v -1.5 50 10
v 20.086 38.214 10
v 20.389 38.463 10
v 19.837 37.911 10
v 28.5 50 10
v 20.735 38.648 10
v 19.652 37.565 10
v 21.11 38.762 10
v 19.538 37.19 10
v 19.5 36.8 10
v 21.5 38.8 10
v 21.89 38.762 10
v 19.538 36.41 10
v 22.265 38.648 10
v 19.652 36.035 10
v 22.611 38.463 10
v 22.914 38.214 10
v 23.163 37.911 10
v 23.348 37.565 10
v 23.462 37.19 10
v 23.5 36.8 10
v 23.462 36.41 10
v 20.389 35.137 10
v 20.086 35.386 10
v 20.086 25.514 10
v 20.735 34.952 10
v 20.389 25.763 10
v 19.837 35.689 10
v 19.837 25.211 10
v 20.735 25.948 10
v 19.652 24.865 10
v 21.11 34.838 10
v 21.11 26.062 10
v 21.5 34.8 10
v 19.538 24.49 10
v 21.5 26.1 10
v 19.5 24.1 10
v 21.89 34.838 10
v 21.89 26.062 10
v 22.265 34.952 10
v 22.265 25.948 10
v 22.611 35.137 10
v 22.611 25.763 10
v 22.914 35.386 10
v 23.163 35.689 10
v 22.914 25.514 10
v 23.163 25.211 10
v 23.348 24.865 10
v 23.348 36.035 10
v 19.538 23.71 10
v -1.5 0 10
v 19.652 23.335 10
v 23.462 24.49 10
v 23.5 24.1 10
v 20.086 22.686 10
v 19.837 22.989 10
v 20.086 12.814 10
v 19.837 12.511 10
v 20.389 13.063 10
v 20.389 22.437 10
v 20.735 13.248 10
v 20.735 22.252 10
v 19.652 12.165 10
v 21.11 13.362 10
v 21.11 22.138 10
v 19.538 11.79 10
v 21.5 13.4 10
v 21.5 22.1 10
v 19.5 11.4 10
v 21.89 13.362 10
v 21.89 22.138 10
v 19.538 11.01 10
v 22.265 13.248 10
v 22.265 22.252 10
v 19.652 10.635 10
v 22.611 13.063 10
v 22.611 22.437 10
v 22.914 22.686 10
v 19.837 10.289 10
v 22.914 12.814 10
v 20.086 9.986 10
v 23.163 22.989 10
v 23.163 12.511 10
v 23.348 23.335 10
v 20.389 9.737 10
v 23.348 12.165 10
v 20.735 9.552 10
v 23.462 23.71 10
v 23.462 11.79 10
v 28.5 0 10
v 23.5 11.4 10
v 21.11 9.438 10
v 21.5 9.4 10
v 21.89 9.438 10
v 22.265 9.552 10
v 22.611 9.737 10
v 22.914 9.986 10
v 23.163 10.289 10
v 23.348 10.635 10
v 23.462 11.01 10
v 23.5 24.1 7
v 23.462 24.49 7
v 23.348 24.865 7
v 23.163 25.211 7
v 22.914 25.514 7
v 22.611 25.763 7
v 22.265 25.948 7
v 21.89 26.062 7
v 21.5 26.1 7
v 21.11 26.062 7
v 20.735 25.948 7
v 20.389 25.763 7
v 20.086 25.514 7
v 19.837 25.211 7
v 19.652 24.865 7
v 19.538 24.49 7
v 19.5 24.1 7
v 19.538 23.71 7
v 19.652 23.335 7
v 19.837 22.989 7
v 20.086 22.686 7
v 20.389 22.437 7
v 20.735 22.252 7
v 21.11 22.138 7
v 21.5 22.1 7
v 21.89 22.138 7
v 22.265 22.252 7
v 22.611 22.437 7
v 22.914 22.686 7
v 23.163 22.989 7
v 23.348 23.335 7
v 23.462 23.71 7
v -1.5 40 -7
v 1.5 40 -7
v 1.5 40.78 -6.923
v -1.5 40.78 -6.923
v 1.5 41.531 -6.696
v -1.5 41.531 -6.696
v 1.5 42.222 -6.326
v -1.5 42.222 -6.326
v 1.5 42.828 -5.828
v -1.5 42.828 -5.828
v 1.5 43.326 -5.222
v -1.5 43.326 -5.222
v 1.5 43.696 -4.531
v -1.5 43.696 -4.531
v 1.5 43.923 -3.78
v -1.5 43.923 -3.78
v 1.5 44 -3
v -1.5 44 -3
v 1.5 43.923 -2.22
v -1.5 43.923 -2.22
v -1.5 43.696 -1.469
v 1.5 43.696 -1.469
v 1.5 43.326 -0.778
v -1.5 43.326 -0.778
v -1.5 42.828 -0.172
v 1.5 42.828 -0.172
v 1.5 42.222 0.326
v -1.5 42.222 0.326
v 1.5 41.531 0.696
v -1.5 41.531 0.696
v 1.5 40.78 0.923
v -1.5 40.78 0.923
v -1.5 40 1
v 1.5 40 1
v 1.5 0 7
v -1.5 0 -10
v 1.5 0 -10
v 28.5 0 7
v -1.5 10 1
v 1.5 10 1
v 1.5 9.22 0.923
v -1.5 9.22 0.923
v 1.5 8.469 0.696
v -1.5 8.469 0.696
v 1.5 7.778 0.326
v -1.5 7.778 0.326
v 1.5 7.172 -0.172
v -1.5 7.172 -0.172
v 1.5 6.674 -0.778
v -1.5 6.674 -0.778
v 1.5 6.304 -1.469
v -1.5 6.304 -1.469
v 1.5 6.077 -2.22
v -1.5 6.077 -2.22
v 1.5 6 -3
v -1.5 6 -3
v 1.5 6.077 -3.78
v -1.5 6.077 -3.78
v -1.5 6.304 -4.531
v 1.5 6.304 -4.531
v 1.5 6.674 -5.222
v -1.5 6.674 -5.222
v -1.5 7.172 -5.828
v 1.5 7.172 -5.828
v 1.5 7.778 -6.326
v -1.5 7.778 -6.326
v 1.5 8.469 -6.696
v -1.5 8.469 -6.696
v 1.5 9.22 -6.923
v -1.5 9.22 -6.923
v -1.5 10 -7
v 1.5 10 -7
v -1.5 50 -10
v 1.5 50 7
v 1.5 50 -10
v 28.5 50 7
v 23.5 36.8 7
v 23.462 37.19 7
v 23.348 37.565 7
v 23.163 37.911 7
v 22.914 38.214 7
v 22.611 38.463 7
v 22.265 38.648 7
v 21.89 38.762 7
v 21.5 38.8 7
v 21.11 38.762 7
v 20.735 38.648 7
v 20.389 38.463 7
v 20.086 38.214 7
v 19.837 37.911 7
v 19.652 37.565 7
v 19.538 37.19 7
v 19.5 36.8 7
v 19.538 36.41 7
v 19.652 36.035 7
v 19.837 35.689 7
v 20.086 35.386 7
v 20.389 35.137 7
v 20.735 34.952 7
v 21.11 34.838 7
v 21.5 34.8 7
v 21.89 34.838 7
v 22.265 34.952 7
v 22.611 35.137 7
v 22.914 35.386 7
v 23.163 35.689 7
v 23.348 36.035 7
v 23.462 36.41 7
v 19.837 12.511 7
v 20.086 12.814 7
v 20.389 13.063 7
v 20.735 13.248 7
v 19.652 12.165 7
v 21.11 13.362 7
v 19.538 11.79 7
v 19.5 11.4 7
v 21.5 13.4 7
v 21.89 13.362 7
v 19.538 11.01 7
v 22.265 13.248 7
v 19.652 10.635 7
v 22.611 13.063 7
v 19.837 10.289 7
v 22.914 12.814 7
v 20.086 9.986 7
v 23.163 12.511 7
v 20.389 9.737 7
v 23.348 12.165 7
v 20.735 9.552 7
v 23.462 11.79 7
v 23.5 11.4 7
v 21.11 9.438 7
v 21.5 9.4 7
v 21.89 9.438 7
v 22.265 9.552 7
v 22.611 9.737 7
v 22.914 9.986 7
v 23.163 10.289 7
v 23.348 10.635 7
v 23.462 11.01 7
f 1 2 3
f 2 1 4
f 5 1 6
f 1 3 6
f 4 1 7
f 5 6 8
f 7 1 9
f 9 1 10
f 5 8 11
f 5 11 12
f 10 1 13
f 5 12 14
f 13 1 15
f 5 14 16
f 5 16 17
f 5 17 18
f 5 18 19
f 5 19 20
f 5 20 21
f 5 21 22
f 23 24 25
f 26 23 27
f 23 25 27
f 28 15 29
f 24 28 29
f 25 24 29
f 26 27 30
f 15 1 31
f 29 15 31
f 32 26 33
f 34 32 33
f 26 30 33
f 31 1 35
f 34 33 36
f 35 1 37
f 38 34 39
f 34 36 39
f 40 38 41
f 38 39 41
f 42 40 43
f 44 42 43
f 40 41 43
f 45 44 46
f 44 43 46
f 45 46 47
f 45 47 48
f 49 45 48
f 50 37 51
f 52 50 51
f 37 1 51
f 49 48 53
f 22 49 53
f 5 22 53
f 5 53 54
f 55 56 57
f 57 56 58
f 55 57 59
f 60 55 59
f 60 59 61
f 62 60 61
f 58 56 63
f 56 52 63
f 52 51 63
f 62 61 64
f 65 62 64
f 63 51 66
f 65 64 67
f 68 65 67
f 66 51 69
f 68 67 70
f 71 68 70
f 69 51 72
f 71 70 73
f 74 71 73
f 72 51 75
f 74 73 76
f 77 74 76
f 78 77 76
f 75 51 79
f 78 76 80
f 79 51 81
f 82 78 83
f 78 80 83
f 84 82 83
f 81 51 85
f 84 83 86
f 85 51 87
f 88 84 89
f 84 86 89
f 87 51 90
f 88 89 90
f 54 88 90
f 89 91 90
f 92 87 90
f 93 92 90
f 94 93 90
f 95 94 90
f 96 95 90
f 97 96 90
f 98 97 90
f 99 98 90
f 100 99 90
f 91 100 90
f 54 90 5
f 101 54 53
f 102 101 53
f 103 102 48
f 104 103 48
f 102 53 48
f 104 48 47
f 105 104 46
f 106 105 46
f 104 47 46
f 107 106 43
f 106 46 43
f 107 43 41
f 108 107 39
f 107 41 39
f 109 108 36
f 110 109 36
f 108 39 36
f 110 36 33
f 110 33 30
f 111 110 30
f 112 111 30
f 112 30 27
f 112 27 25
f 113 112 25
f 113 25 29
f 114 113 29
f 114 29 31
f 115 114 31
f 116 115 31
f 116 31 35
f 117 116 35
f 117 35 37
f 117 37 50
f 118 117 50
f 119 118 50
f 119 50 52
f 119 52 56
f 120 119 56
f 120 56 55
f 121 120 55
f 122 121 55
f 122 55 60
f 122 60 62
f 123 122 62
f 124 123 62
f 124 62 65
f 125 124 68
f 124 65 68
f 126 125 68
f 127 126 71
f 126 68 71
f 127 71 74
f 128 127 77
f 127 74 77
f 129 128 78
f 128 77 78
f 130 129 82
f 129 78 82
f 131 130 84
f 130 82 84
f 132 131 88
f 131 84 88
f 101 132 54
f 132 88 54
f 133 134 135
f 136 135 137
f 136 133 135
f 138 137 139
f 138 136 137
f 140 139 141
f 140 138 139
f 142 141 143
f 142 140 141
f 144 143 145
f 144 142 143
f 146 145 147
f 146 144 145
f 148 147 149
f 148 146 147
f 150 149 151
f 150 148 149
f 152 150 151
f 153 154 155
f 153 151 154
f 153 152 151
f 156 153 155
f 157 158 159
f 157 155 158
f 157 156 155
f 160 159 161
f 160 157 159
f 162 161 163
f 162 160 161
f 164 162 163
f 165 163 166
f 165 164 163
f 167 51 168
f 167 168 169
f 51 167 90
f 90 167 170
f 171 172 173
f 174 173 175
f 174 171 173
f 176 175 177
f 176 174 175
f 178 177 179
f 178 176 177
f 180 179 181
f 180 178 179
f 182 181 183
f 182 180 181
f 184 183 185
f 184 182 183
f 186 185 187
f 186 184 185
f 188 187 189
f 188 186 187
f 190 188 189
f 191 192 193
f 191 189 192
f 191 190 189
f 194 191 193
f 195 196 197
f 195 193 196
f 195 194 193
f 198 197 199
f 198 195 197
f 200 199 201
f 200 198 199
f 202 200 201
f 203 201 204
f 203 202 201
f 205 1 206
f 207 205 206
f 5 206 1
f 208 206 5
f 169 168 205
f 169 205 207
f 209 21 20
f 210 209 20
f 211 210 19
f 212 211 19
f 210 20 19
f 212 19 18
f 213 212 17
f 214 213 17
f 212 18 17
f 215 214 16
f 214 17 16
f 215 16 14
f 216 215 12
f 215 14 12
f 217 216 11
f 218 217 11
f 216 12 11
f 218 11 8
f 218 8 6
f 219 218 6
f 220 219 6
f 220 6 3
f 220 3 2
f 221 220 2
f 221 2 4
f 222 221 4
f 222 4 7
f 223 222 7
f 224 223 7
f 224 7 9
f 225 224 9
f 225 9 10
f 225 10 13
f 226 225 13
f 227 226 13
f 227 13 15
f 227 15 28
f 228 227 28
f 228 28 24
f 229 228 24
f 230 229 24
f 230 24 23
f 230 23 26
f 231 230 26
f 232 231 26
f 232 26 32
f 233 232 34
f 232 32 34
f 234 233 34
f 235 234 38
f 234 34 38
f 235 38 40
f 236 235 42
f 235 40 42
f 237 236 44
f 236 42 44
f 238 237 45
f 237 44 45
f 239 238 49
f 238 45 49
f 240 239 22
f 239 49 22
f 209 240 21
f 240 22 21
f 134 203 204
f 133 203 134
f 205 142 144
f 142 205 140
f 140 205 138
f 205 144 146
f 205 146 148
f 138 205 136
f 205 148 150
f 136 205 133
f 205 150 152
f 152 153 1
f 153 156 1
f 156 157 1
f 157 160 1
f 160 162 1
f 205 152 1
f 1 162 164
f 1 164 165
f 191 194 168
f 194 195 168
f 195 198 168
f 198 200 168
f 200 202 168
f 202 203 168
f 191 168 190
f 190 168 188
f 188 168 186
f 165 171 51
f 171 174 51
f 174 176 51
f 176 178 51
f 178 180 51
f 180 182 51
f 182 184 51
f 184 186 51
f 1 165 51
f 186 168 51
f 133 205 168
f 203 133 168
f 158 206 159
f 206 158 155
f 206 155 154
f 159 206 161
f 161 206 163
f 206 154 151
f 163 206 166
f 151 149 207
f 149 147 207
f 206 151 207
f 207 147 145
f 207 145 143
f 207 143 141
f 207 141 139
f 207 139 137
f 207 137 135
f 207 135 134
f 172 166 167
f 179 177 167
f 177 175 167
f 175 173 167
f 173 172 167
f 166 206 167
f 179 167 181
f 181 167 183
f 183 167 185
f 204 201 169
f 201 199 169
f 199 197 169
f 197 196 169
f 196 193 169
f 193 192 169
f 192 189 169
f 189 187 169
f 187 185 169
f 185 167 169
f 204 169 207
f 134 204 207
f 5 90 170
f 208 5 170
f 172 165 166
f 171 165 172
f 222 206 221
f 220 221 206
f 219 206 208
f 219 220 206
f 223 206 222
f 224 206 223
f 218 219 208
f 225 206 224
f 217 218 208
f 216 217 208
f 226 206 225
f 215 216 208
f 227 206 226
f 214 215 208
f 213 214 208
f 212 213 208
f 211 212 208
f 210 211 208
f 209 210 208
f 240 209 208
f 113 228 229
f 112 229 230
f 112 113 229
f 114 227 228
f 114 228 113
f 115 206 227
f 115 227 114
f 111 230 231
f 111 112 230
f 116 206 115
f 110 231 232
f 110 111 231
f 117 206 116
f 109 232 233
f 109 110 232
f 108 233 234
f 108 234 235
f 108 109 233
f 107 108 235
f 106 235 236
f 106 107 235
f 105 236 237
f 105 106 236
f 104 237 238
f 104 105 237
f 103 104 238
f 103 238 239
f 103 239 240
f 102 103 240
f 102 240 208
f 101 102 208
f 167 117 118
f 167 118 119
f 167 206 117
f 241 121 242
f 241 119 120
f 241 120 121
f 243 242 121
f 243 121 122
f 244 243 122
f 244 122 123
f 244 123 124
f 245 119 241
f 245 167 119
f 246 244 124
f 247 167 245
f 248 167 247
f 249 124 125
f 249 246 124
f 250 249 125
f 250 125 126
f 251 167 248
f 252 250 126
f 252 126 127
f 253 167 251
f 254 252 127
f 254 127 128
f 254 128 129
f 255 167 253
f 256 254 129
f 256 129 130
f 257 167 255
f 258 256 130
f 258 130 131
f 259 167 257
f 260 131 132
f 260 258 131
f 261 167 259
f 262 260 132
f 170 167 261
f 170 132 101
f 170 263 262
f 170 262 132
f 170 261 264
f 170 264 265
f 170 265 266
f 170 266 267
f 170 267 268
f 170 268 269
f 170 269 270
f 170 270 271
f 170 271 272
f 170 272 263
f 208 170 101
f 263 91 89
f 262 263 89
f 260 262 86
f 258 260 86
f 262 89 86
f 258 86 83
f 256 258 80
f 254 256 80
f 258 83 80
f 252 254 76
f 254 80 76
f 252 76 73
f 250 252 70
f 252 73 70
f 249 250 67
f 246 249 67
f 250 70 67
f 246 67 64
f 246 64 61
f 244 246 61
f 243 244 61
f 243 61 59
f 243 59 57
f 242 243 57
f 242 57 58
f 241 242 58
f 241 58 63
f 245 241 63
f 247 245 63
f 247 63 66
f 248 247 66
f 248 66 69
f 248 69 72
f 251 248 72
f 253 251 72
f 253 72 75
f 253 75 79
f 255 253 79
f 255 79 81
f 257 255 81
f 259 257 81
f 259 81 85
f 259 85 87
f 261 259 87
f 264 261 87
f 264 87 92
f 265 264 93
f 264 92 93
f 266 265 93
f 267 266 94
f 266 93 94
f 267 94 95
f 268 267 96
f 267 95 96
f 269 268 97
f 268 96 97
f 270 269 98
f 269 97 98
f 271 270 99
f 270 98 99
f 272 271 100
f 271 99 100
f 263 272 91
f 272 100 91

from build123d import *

# Parameters (mm, degrees)
SKETCH_1_W          = 3
SKETCH_1_H          = 17
SKETCH_1_H_2        = 3
SKETCH_1_W_2        = 27
EXTRUDE_1_DEPTH     = 50
SKETCH_2_R          = 2
CUT_EXTRUDE_1_DEPTH = 10
CUT_EXTRUDE_2_DEPTH = 10


with BuildPart() as part:
    # 草图1 → 凸台-拉伸1 (new body)
    with BuildSketch(Plane(origin=(0, 0, 0), x_dir=(1, 0, 0), z_dir=(0, 1, 0))):
        with Locations((0, 1.5)):
            Rectangle(SKETCH_1_W, SKETCH_1_H)
        with Locations((0, -8.5)):
            Rectangle(SKETCH_1_W, SKETCH_1_H_2)
        with Locations((15, -8.5)):
            Rectangle(SKETCH_1_W_2, SKETCH_1_H_2)
    extrude(amount=EXTRUDE_1_DEPTH)

    # 草图2 → 切除-拉伸1 (cut)
    with BuildSketch(Plane.XY.offset(10)):
        with Locations((21.5, 36.8)):
            Circle(SKETCH_2_R)
        with Locations((21.5, 24.1)):
            Circle(SKETCH_2_R)
        with Locations((21.5, 11.4)):
            Circle(SKETCH_2_R)
    extrude(amount=-CUT_EXTRUDE_1_DEPTH, mode=Mode.SUBTRACT)

    # 草图3 → 切除-拉伸2 (cut)
    with BuildSketch(Plane.ZY.offset(1.5)):
        with BuildLine():
            Line((1, 40), (1, 10))
            ThreePointArc((1, 10), (-3, 6), (-7, 10))
            Line((-7, 10), (-7, 40))
            ThreePointArc((-7, 40), (-3, 44), (1, 40))
        make_face()
    extrude(amount=-CUT_EXTRUDE_2_DEPTH, mode=Mode.SUBTRACT)


solid = part.part
